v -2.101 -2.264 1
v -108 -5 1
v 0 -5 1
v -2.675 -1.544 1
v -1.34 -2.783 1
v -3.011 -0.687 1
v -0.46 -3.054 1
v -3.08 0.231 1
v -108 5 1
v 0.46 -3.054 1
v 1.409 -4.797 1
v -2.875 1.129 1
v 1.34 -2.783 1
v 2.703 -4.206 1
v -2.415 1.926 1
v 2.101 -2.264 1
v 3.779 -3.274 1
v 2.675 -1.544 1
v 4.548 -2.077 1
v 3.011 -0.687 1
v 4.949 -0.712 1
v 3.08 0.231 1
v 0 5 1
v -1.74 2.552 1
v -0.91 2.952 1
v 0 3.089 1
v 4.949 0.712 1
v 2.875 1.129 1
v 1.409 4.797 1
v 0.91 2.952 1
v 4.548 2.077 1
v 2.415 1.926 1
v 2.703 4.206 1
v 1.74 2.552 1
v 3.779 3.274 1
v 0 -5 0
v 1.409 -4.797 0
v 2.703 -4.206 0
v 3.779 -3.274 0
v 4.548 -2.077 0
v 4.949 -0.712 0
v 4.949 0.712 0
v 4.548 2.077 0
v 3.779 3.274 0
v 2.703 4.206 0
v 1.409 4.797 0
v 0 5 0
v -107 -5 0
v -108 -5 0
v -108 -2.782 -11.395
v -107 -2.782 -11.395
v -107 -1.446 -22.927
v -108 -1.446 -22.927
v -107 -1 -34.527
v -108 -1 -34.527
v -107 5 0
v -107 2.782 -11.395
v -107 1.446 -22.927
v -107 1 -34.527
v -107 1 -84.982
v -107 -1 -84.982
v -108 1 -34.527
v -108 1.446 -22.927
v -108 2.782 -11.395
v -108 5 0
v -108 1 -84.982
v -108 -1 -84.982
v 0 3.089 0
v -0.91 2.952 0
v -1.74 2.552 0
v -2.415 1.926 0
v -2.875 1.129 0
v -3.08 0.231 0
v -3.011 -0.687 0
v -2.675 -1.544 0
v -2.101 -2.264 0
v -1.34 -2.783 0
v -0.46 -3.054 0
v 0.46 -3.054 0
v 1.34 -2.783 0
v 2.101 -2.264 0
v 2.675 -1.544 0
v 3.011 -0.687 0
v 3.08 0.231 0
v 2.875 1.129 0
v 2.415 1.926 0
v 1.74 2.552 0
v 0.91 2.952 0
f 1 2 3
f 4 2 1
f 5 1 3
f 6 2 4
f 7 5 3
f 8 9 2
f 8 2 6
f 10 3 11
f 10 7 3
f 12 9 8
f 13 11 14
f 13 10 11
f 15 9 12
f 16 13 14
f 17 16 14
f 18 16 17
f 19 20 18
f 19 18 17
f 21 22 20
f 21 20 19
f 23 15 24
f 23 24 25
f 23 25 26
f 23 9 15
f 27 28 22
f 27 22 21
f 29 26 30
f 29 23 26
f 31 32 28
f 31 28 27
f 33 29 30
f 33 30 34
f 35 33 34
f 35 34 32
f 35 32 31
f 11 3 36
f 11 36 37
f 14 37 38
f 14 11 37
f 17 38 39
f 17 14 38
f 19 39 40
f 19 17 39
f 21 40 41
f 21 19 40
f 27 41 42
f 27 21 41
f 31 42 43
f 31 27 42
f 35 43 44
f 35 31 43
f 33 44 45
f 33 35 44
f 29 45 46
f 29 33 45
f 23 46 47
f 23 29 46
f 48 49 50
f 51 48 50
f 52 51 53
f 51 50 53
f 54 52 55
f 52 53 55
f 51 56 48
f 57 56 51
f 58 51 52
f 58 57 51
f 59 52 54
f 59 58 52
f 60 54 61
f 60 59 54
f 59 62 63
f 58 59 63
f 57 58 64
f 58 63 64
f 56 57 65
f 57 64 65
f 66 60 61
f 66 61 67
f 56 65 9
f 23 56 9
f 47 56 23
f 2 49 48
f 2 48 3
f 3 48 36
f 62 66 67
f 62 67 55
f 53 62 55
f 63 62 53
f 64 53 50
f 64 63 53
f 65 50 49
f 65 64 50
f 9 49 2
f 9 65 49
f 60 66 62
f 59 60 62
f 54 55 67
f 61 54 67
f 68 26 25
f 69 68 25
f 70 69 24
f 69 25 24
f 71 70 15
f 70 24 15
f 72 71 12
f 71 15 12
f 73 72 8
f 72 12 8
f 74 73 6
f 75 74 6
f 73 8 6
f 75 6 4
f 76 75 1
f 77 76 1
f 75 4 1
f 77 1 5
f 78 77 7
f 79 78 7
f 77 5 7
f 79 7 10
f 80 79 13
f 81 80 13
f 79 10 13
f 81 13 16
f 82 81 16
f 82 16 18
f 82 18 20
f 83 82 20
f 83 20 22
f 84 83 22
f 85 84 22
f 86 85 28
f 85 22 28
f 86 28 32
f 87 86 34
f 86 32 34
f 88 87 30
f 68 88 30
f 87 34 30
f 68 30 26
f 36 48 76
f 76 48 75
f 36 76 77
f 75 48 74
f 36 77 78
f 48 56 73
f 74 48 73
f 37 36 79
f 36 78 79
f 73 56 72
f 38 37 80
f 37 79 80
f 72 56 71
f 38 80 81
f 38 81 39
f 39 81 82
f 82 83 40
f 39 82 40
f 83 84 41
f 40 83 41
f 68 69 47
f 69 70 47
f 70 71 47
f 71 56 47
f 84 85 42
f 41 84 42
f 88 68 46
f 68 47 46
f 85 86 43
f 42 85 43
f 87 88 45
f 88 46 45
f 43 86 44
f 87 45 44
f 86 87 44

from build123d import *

# Parameters (mm, degrees)
BOSS_EXTRUDE1_DEPTH     = 5
SKETCH2_R               = 5
SKETCH2_R_2             = 3.088913235
BOSS_EXTRUDE2_DEPTH     = 1
SKETCH3_R               = 3.088913235
CUT_EXTRUDE1_DEPTH      = 1
CUT_EXTRUDE2_DEPTH      = 1
CUT_EXTRUDE2_DEPTH_BACK = 10


with BuildPart() as part:
    # Sketch1 → Boss-Extrude1 (new body, symmetric)
    with BuildSketch(Plane(origin=(0, 0, 0), x_dir=(1, 0, 0), z_dir=(0, 1, 0))):
        Polygon((0, 0), (-107, 0), (-107, 84.981911775), (-108, 84.981911775), (-108, -1), (0, -1), align=None)
    extrude(amount=BOSS_EXTRUDE1_DEPTH, both=True)

    # Sketch2 → Boss-Extrude2 (add)
    with BuildSketch(Plane.XY.offset(1)):
        Circle(SKETCH2_R)
        Circle(SKETCH2_R_2, mode=Mode.SUBTRACT)
    extrude(amount=-BOSS_EXTRUDE2_DEPTH)

    # Sketch3 → Cut-Extrude1 (cut)
    with BuildSketch(Plane.XY.offset(1)):
        Circle(SKETCH3_R)
    extrude(amount=-CUT_EXTRUDE1_DEPTH, mode=Mode.SUBTRACT)

    # Sketch4 → Cut-Extrude2 (cut, two sides)
    with BuildSketch(Plane.ZY.offset(108)) as cut_extrude2_sk:
        with BuildLine():
            Line((-84.981911775, 5), (-84.981911775, 1))
            Line((-84.981911775, 1), (-34.527427825, 1))
            ThreePointArc((-34.527427825, 1), (-17.14825011, 2.003332972), (0, 5))
            Line((0, 5), (-84.981911775, 5))
        make_face()
        with BuildLine():
            Line((-34.527427825, -1), (-84.981911775, -1))
            Line((-84.981911775, -1), (-84.981911775, -5))
            Line((-84.981911775, -5), (0, -5))
            ThreePointArc((0, -5), (-17.14825011, -2.003332972), (-34.527427825, -1))
        make_face()
    extrude(amount=CUT_EXTRUDE2_DEPTH, mode=Mode.SUBTRACT)
    extrude(cut_extrude2_sk.sketch, amount=-CUT_EXTRUDE2_DEPTH_BACK, mode=Mode.SUBTRACT)


solid = part.part
